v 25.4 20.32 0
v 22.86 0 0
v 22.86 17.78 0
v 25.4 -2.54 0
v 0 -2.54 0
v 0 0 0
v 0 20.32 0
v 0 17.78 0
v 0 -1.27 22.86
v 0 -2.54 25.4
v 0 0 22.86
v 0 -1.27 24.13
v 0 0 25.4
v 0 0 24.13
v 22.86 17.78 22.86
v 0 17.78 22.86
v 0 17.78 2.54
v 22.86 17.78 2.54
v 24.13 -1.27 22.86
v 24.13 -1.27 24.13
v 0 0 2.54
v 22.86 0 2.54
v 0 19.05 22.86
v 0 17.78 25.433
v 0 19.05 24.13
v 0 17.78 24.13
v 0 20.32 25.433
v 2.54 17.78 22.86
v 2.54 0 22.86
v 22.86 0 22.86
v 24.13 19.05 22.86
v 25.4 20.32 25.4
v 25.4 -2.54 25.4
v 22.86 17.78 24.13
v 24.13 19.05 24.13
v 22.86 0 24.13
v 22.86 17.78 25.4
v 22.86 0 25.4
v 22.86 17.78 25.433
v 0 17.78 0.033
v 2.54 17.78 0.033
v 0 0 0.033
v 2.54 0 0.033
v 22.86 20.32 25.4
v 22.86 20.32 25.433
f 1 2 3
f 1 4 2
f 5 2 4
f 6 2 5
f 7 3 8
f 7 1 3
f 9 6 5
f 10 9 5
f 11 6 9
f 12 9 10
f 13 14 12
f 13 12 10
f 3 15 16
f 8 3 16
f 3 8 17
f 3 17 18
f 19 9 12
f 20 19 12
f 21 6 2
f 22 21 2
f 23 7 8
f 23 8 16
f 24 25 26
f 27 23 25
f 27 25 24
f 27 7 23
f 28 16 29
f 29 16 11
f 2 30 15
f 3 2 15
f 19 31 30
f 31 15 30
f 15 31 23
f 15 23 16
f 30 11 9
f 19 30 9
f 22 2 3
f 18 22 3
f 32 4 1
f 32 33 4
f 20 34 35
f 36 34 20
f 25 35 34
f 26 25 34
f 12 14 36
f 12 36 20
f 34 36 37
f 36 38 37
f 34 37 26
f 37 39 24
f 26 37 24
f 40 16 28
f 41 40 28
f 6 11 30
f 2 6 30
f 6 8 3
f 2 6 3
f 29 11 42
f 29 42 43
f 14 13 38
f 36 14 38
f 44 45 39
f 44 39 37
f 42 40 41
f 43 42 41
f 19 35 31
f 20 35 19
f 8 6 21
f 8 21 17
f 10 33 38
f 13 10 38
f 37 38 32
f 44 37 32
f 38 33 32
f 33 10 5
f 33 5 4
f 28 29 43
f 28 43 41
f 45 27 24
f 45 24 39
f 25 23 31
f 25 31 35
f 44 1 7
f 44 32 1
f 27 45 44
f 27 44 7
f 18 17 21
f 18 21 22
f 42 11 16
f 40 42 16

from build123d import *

# Parameters (mm, degrees)
F0_W      = 25.4
F0_H      = 25.4
F1_DEPTH  = 2.54
F2_W      = 20.32
F2_H      = 25.4
F3_DEPTH  = 2.54
F5_DEPTH  = 2.54
F6_W      = 2.54
F6_H      = 17.78
F7_DEPTH  = 25.4
F8_W      = 22.86
F8_H      = 17.78
F9_DEPTH  = 2.54
F10_W     = 1.27
F10_H     = 1.27
F11_DEPTH = 22.86
F13_DEPTH = 1.27


with BuildPart() as f1:
    # F0 (on Front) → F1 (new body)
    with BuildSketch(Plane.XZ):
        with Locations((12.7, 12.7)):
            Rectangle(F0_W, F0_H)
    extrude(amount=F1_DEPTH)

    # F2 (on face) → F3 (join)
    with BuildSketch(Plane.YZ.offset(25.4)):
        with Locations((10.16, 12.7)):
            Rectangle(F2_W, F2_H)
    extrude(amount=-F3_DEPTH)

    # F4 (on face) → F5 (join)
    with BuildSketch(Plane(origin=(0, 20.32, 0), x_dir=(-1, 0, 0), z_dir=(0, 1, 0))):
        Polygon((-22.86, 25.4), (-22.86, 0), (0, 0), (0, 25.4329182208), (-22.86, 25.4329182208), align=None)
    extrude(amount=-F5_DEPTH)


with BuildPart() as f7:
    # F6 (on face) → F7 (new body)
    with BuildSketch(Plane.XY.offset(25.4329182208)):
        with Locations((1.27, 8.89)):
            Rectangle(F6_W, F6_H)
    extrude(amount=-F7_DEPTH)


with BuildPart() as f9:
    # F8 (on Top) → F9 (new body)
    with BuildSketch(Plane.XY):
        with Locations((11.43, 8.89)):
            Rectangle(F8_W, F8_H)
    extrude(amount=F9_DEPTH)


with BuildPart() as f11_tool:
    # F10 (on face) → F11 (new body)
    with BuildSketch(Plane(origin=(0, 0, 0), x_dir=(0, -1, 0), z_dir=(-1, 0, 0))):
        with Locations((0.635, 23.495)):
            Rectangle(F10_W, F10_H)
        Polygon((-17.78, 22.86), (0, 22.86), (0, 24.13), (0, 25.4329182208), (-17.78, 25.4329182208), (-17.78, 24.13), align=None)
        with Locations((-18.415, 23.495)):
            Rectangle(F10_W, F10_H)
    extrude(amount=-F11_DEPTH)


with BuildPart() as f1_1:
    add(f1.part)

    # F11: cut by f11_tool
    add(f11_tool.part, mode=Mode.SUBTRACT)

    # F12 (on face) → F13 (cut)
    with BuildSketch(Plane(origin=(22.86, 0, 0), x_dir=(0, -1, 0), z_dir=(-1, 0, 0))):
        Polygon((-17.78, 24.13), (-19.05, 24.13), (-19.05, 22.86), (-17.78, 22.86), (0, 22.86), (1.27, 22.86), (1.27, 24.13), (0, 24.13), align=None)
    extrude(amount=-F13_DEPTH, mode=Mode.SUBTRACT)


with BuildPart() as f7_1:
    add(f7.part)

    # F11: cut by f11_tool
    add(f11_tool.part, mode=Mode.SUBTRACT)


solid = Compound([f9.part, f1_1.part, f7_1.part])
